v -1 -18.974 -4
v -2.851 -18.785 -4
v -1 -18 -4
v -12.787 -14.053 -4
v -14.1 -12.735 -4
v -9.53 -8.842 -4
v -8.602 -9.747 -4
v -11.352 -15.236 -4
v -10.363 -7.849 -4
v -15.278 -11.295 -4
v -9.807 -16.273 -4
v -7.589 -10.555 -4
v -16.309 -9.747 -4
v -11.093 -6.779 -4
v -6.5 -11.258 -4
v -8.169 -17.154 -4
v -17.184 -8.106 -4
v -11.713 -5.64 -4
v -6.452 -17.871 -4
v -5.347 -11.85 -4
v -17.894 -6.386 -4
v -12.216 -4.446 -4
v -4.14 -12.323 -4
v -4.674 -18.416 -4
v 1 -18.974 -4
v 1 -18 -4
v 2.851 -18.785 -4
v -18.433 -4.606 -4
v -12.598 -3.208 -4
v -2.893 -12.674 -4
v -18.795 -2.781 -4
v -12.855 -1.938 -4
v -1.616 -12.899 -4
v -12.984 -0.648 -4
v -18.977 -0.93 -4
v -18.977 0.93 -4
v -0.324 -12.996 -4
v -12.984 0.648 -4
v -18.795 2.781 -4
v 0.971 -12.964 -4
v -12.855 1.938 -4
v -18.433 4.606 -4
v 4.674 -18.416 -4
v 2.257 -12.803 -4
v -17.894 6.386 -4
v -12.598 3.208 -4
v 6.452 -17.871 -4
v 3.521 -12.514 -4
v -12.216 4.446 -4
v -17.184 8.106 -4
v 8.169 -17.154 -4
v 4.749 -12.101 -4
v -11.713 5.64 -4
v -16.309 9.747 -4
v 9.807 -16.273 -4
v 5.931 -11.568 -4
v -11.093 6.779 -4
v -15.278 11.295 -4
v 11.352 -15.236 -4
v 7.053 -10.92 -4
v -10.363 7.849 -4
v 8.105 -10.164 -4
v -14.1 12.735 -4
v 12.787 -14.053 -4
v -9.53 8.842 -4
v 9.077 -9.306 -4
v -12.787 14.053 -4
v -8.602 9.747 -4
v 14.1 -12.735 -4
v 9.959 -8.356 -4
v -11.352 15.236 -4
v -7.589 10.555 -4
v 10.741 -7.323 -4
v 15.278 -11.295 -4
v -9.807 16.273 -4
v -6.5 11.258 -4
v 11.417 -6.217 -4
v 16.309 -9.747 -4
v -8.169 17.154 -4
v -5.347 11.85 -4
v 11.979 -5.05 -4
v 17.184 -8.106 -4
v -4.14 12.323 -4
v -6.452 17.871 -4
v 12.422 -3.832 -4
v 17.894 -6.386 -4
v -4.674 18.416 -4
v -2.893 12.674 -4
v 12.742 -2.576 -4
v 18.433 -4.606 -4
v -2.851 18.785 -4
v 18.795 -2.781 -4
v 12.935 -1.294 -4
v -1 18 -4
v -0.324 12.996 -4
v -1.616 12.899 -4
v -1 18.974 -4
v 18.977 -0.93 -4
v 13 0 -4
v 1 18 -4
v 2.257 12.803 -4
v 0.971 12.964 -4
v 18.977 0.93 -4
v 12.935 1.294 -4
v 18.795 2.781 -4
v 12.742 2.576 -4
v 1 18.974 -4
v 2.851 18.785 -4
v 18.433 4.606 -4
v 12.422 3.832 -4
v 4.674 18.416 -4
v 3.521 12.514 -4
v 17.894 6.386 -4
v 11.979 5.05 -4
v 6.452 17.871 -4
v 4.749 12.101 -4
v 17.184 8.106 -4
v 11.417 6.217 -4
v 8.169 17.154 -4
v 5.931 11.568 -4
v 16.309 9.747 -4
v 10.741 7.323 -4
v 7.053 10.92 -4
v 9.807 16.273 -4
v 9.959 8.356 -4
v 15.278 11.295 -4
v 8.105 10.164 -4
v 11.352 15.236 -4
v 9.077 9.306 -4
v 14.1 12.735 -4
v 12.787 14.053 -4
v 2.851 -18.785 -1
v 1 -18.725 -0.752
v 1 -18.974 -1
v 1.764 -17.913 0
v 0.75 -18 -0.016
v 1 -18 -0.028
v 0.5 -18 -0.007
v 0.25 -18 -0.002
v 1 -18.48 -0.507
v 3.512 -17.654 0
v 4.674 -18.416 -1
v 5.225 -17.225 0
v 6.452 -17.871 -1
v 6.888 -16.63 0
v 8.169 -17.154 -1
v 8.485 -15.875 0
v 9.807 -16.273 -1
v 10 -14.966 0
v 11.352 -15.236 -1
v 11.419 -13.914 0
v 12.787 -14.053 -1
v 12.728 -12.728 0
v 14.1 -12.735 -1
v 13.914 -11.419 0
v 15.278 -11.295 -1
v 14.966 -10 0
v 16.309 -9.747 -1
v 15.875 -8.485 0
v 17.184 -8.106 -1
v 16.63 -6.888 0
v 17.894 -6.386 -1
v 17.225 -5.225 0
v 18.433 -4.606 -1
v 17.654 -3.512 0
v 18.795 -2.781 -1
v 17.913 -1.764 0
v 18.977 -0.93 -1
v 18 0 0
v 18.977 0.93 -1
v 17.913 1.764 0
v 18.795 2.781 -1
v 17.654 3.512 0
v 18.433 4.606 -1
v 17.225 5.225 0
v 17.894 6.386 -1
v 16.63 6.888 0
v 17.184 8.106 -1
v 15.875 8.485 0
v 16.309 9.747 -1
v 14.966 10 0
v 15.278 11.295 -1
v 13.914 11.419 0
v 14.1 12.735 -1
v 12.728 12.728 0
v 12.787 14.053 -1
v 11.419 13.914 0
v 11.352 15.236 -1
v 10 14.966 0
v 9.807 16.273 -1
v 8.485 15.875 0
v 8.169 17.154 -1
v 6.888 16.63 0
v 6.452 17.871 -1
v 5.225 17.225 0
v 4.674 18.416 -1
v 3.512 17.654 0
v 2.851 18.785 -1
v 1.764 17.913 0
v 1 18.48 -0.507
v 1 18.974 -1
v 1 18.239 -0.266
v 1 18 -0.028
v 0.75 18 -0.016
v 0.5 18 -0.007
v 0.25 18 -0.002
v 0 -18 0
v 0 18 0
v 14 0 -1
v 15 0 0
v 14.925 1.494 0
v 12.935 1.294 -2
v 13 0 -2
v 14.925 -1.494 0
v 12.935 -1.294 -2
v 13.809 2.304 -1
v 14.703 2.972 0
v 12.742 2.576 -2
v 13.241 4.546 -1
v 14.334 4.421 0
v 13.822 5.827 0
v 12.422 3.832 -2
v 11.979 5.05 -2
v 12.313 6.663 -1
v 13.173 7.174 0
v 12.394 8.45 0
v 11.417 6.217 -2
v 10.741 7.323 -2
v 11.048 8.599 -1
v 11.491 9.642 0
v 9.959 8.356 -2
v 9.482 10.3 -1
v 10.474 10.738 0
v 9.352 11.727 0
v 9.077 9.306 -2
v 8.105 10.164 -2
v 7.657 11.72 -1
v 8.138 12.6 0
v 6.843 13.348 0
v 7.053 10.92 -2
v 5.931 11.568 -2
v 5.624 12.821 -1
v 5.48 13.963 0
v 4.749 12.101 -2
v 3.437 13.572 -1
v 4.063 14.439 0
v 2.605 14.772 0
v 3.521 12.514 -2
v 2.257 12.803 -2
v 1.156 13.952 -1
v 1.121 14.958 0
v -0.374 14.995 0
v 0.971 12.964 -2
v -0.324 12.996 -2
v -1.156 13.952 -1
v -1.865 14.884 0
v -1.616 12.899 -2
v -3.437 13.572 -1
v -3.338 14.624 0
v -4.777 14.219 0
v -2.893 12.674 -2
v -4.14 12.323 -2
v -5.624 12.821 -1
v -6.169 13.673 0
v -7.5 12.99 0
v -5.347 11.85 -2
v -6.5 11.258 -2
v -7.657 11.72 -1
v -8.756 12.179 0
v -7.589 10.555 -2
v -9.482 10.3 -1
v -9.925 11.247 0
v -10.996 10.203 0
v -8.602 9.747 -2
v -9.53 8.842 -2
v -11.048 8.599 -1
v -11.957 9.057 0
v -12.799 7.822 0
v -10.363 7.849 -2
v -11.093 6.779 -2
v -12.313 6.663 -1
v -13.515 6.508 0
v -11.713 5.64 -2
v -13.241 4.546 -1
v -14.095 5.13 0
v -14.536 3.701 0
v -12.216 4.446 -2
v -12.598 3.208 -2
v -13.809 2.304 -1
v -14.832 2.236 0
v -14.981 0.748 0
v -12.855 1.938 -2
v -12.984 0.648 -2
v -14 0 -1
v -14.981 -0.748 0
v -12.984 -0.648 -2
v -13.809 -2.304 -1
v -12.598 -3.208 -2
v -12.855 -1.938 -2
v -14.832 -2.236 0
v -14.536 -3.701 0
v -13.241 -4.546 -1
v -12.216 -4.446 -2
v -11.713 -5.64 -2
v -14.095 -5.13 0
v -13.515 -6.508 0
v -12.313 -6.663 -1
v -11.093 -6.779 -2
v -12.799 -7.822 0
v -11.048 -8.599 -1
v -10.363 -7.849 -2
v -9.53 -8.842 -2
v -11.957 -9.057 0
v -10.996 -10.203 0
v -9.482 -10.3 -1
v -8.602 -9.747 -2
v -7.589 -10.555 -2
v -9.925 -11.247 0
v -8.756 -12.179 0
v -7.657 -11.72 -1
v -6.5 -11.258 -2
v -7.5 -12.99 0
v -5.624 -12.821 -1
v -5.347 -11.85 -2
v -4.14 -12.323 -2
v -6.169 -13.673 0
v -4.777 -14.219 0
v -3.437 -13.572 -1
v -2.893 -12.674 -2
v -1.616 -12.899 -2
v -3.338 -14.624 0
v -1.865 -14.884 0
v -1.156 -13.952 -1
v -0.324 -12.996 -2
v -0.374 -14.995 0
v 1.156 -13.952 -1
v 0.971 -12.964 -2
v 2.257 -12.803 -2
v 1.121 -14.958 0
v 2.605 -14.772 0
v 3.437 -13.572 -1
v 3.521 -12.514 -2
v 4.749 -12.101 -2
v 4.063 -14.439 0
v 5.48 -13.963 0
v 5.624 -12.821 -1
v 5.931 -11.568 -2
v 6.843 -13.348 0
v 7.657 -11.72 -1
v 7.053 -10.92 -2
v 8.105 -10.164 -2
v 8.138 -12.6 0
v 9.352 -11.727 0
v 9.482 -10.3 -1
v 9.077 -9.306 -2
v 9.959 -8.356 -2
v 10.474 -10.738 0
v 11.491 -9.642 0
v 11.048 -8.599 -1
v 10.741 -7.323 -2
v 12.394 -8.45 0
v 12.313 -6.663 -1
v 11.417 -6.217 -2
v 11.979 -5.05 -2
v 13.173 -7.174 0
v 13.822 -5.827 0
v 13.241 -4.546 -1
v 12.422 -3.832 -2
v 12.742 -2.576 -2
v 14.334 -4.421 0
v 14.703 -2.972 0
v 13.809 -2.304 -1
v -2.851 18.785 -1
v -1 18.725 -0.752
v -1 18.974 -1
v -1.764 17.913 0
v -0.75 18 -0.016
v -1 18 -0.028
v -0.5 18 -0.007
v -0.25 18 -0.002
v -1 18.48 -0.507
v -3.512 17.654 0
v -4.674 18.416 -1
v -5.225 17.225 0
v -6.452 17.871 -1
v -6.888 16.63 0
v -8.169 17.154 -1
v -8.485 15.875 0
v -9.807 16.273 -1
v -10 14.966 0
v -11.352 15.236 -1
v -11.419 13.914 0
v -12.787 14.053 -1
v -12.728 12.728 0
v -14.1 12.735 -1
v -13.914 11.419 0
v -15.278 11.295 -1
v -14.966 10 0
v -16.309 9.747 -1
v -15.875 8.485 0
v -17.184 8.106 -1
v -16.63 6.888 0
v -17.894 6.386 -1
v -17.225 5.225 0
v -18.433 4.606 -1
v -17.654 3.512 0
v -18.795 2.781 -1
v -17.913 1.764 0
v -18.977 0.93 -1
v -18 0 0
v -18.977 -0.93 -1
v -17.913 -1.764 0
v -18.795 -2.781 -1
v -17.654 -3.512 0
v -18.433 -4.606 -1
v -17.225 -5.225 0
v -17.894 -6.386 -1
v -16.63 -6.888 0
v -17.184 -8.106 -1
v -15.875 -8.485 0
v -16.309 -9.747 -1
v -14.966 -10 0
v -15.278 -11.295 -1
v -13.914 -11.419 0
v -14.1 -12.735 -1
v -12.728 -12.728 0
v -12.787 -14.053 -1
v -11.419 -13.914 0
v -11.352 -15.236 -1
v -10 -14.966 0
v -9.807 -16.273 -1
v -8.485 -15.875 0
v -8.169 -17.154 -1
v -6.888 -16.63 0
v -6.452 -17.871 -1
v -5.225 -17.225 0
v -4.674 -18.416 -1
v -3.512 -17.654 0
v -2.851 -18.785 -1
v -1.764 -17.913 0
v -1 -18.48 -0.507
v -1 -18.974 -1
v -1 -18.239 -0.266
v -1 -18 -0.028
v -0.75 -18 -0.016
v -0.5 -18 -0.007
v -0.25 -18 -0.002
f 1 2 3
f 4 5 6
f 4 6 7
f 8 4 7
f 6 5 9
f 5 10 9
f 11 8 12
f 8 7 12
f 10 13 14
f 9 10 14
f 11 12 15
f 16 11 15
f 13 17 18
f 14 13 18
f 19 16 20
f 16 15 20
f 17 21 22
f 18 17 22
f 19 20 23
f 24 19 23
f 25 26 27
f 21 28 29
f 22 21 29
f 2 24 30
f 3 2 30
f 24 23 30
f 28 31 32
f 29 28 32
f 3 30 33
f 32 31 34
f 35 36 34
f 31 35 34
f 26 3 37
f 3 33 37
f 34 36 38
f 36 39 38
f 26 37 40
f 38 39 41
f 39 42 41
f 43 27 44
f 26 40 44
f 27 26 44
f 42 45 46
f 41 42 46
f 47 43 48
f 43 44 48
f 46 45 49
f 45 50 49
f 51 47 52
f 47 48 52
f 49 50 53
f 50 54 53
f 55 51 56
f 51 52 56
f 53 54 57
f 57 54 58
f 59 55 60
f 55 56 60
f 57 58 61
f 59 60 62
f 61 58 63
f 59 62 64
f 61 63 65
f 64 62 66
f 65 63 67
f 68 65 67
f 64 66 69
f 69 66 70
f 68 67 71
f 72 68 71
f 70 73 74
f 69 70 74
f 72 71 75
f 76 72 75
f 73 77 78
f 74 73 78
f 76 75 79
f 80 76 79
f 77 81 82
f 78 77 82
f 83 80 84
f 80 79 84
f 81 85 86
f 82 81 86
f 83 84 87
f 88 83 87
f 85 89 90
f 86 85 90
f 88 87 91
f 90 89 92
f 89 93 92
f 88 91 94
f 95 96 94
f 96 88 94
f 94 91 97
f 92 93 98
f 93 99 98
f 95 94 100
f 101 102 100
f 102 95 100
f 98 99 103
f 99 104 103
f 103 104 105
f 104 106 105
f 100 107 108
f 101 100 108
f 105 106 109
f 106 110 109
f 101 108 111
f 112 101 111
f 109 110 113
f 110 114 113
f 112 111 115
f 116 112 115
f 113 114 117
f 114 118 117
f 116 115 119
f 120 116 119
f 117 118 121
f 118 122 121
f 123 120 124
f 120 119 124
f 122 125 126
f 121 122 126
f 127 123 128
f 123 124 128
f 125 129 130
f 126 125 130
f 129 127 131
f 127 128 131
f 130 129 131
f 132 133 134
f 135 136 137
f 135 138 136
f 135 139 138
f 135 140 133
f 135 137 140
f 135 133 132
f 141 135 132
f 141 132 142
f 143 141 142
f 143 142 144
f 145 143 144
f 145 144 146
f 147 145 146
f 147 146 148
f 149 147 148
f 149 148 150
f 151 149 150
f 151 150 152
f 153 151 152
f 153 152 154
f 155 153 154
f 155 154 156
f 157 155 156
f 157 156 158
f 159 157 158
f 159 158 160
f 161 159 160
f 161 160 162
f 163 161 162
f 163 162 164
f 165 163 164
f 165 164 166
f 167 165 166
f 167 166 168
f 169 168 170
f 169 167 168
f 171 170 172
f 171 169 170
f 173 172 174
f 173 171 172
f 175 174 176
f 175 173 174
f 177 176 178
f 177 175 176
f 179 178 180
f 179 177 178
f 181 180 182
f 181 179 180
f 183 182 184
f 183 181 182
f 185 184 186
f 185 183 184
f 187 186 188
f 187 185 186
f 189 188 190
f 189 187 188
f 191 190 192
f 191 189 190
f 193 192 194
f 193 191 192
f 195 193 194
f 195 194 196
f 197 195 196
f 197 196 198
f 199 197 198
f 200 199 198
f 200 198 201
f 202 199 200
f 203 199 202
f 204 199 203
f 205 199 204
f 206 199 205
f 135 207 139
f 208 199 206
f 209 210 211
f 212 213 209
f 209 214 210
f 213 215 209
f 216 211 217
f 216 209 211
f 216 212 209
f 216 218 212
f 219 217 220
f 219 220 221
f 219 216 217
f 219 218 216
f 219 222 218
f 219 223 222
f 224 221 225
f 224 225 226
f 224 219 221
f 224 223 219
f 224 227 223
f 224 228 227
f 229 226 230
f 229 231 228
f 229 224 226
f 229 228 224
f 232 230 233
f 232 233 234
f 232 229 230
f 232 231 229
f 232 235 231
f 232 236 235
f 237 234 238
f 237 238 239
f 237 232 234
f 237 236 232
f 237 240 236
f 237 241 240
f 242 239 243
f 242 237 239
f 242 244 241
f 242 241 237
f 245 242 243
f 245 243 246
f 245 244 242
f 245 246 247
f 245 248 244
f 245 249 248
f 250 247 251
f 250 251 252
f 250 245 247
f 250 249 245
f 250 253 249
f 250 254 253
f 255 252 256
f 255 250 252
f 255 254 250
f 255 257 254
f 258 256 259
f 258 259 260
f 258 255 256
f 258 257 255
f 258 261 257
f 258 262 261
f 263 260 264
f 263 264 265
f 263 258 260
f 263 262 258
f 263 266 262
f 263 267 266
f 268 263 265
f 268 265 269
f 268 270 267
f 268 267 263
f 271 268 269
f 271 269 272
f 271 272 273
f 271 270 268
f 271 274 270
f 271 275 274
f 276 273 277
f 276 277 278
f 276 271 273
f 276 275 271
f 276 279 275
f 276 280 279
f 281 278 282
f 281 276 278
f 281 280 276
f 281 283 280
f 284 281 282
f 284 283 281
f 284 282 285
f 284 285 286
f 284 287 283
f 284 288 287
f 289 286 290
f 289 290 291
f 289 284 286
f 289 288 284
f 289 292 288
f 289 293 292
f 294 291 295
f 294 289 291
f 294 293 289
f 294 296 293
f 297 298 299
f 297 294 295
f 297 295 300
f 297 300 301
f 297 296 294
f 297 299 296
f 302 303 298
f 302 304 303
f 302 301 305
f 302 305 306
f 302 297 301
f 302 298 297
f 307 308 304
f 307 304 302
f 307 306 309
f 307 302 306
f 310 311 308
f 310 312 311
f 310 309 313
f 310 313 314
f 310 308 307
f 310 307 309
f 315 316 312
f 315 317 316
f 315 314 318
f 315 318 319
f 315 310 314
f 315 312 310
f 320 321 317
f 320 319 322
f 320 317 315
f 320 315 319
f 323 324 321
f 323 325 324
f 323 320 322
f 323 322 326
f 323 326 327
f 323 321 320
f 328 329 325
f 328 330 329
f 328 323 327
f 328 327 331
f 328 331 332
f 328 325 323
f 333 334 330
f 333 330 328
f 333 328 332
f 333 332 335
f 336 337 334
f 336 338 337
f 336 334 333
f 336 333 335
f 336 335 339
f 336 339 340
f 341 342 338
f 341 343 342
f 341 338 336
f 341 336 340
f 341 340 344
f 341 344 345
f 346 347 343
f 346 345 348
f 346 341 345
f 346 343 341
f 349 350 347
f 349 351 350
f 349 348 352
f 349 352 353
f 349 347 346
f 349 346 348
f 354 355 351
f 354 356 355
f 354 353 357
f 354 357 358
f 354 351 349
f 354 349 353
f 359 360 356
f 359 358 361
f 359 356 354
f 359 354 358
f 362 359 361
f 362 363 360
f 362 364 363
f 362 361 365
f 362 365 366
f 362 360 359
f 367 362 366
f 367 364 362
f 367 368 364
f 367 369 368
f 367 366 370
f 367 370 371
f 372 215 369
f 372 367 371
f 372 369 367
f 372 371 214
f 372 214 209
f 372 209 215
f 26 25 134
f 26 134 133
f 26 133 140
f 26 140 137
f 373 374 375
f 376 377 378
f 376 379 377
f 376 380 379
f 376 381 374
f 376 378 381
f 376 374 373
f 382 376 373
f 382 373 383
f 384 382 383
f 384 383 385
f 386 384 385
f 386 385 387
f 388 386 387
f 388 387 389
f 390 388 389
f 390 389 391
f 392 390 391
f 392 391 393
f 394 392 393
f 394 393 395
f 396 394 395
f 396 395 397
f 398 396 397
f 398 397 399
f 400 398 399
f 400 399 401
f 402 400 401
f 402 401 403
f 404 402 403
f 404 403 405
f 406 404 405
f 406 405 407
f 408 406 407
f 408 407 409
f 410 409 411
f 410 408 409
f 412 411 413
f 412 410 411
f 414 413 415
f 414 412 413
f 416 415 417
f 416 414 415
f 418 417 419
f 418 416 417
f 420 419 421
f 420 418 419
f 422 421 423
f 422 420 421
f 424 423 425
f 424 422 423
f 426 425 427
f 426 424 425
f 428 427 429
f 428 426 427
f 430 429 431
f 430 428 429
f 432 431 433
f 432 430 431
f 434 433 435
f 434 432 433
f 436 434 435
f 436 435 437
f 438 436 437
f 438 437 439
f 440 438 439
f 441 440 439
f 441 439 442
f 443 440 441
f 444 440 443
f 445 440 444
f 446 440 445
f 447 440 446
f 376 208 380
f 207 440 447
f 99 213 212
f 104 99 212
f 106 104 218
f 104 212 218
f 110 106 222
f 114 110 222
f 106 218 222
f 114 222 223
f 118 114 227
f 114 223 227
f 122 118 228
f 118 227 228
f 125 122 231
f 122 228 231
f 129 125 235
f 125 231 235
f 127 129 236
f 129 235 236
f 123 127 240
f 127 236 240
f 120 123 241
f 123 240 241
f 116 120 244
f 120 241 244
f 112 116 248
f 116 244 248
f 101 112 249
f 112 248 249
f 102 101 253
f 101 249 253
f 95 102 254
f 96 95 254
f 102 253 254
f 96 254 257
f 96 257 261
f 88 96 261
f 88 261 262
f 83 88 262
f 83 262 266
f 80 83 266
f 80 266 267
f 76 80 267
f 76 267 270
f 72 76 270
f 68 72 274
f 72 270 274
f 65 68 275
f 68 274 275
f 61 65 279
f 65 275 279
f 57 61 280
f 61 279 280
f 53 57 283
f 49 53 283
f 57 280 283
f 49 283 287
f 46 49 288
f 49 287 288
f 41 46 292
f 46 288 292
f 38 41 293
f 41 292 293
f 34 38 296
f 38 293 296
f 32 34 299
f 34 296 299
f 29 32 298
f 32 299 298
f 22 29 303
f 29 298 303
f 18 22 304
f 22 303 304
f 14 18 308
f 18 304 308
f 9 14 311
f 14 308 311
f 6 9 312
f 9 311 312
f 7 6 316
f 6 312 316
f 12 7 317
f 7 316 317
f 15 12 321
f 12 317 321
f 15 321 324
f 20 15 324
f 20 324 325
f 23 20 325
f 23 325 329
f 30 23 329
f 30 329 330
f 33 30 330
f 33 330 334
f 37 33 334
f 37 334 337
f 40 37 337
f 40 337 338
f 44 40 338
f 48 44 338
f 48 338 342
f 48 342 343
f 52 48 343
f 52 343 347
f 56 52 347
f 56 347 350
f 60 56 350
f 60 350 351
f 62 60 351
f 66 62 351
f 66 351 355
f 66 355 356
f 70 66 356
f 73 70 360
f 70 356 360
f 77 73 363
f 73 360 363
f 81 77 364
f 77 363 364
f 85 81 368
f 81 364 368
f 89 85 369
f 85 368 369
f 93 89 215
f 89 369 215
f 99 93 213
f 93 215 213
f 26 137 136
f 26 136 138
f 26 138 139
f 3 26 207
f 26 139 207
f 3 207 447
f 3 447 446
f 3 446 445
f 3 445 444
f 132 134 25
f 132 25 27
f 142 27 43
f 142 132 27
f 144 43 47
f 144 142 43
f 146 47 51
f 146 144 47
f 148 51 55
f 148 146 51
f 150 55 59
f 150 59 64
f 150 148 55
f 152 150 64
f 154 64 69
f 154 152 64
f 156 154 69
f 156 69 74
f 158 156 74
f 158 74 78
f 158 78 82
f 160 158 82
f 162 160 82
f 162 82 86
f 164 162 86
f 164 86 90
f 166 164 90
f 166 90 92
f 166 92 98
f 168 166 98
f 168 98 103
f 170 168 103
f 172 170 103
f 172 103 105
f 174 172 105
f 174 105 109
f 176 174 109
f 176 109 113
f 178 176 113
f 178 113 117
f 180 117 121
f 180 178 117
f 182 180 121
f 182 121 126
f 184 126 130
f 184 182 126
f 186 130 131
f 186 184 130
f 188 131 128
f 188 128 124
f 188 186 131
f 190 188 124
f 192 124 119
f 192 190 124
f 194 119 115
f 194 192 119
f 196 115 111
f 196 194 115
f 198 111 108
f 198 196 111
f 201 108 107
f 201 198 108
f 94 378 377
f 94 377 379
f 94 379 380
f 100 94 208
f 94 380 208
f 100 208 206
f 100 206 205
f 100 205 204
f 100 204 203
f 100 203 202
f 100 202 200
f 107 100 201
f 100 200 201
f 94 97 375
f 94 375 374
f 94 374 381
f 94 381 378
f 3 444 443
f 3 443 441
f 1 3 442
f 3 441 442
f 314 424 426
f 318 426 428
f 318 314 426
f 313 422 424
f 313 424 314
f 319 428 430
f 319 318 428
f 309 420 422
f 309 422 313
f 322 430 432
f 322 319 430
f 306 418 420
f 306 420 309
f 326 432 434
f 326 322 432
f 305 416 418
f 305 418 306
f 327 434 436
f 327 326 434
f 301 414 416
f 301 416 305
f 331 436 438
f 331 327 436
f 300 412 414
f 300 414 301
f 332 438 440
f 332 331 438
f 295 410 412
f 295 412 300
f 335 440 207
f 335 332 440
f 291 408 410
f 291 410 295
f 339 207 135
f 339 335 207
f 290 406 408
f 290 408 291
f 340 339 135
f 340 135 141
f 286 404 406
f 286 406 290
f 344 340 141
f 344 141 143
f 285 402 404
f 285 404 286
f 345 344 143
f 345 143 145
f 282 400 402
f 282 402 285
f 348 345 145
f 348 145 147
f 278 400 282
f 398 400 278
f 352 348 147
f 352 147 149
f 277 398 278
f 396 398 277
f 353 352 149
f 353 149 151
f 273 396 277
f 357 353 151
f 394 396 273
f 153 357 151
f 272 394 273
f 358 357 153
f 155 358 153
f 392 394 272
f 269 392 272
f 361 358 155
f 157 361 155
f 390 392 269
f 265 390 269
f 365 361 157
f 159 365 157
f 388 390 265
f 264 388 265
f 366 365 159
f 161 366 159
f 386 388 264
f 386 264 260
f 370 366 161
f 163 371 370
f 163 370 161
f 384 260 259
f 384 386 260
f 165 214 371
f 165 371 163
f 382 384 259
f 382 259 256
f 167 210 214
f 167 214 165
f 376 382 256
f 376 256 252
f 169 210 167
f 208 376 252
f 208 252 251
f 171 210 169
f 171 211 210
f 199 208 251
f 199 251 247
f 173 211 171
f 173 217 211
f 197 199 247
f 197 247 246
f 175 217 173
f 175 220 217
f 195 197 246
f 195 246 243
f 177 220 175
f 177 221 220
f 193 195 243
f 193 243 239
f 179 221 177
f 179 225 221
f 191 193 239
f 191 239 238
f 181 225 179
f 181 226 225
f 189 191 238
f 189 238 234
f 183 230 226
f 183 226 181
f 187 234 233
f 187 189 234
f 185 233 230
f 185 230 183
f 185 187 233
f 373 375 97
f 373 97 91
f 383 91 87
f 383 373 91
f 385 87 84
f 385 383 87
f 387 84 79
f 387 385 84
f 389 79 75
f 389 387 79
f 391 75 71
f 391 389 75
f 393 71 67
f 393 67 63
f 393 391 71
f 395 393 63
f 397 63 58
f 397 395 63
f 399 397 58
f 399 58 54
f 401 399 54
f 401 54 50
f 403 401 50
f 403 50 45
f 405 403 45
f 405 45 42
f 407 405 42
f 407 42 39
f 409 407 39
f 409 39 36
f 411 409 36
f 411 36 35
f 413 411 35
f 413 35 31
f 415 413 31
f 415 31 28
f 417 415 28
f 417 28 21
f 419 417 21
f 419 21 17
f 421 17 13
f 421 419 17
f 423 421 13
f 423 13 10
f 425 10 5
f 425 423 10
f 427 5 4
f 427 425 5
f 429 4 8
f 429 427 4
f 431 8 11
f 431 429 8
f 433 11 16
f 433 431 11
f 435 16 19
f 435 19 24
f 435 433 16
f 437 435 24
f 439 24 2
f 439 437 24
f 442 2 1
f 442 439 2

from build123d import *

# Parameters (mm, degrees)
F0_R     = 19
F0_R_2   = 13
F1_DEPTH = 4
F2_SIZE  = 1
F3_SIZE  = 2
F5_DEPTH = 4.001


with BuildPart() as f1:
    # F0 (on Top) → F1 (new body)
    with BuildSketch(Plane.XY):
        Circle(F0_R)
        Circle(F0_R_2, mode=Mode.SUBTRACT)
    extrude(amount=-F1_DEPTH)

    # F2
    f2_edges = [f1.edges().sort_by_distance(p)[0] for p in [
        (-19, 0, 0),
    ]]
    chamfer(f2_edges, length=F2_SIZE)

    # F3
    f3_edges = [f1.edges().sort_by_distance(p)[0] for p in [
        (-13, 0, 0),
    ]]
    chamfer(f3_edges, length=F3_SIZE)

    # F4 (on face) → F5 (cut, through all)
    with BuildSketch(Plane.XY):
        with BuildLine():
            Line((-1, 18.973666), (-1, 18))
            Line((-1, 18), (1, 18))
            Line((1, 18), (1, 18.973666))
            ThreePointArc((1, 18.973666), (0, 19), (-1, 18.973666))
        make_face()
        with BuildLine():
            Line((1, -18), (-1, -18))
            Line((-1, -18), (-1, -18.973666))
            ThreePointArc((-1, -18.973666), (0, -19), (1, -18.973666))
            Line((1, -18.973666), (1, -18))
        make_face()
    extrude(amount=-F5_DEPTH, mode=Mode.SUBTRACT)


solid = f1.part
